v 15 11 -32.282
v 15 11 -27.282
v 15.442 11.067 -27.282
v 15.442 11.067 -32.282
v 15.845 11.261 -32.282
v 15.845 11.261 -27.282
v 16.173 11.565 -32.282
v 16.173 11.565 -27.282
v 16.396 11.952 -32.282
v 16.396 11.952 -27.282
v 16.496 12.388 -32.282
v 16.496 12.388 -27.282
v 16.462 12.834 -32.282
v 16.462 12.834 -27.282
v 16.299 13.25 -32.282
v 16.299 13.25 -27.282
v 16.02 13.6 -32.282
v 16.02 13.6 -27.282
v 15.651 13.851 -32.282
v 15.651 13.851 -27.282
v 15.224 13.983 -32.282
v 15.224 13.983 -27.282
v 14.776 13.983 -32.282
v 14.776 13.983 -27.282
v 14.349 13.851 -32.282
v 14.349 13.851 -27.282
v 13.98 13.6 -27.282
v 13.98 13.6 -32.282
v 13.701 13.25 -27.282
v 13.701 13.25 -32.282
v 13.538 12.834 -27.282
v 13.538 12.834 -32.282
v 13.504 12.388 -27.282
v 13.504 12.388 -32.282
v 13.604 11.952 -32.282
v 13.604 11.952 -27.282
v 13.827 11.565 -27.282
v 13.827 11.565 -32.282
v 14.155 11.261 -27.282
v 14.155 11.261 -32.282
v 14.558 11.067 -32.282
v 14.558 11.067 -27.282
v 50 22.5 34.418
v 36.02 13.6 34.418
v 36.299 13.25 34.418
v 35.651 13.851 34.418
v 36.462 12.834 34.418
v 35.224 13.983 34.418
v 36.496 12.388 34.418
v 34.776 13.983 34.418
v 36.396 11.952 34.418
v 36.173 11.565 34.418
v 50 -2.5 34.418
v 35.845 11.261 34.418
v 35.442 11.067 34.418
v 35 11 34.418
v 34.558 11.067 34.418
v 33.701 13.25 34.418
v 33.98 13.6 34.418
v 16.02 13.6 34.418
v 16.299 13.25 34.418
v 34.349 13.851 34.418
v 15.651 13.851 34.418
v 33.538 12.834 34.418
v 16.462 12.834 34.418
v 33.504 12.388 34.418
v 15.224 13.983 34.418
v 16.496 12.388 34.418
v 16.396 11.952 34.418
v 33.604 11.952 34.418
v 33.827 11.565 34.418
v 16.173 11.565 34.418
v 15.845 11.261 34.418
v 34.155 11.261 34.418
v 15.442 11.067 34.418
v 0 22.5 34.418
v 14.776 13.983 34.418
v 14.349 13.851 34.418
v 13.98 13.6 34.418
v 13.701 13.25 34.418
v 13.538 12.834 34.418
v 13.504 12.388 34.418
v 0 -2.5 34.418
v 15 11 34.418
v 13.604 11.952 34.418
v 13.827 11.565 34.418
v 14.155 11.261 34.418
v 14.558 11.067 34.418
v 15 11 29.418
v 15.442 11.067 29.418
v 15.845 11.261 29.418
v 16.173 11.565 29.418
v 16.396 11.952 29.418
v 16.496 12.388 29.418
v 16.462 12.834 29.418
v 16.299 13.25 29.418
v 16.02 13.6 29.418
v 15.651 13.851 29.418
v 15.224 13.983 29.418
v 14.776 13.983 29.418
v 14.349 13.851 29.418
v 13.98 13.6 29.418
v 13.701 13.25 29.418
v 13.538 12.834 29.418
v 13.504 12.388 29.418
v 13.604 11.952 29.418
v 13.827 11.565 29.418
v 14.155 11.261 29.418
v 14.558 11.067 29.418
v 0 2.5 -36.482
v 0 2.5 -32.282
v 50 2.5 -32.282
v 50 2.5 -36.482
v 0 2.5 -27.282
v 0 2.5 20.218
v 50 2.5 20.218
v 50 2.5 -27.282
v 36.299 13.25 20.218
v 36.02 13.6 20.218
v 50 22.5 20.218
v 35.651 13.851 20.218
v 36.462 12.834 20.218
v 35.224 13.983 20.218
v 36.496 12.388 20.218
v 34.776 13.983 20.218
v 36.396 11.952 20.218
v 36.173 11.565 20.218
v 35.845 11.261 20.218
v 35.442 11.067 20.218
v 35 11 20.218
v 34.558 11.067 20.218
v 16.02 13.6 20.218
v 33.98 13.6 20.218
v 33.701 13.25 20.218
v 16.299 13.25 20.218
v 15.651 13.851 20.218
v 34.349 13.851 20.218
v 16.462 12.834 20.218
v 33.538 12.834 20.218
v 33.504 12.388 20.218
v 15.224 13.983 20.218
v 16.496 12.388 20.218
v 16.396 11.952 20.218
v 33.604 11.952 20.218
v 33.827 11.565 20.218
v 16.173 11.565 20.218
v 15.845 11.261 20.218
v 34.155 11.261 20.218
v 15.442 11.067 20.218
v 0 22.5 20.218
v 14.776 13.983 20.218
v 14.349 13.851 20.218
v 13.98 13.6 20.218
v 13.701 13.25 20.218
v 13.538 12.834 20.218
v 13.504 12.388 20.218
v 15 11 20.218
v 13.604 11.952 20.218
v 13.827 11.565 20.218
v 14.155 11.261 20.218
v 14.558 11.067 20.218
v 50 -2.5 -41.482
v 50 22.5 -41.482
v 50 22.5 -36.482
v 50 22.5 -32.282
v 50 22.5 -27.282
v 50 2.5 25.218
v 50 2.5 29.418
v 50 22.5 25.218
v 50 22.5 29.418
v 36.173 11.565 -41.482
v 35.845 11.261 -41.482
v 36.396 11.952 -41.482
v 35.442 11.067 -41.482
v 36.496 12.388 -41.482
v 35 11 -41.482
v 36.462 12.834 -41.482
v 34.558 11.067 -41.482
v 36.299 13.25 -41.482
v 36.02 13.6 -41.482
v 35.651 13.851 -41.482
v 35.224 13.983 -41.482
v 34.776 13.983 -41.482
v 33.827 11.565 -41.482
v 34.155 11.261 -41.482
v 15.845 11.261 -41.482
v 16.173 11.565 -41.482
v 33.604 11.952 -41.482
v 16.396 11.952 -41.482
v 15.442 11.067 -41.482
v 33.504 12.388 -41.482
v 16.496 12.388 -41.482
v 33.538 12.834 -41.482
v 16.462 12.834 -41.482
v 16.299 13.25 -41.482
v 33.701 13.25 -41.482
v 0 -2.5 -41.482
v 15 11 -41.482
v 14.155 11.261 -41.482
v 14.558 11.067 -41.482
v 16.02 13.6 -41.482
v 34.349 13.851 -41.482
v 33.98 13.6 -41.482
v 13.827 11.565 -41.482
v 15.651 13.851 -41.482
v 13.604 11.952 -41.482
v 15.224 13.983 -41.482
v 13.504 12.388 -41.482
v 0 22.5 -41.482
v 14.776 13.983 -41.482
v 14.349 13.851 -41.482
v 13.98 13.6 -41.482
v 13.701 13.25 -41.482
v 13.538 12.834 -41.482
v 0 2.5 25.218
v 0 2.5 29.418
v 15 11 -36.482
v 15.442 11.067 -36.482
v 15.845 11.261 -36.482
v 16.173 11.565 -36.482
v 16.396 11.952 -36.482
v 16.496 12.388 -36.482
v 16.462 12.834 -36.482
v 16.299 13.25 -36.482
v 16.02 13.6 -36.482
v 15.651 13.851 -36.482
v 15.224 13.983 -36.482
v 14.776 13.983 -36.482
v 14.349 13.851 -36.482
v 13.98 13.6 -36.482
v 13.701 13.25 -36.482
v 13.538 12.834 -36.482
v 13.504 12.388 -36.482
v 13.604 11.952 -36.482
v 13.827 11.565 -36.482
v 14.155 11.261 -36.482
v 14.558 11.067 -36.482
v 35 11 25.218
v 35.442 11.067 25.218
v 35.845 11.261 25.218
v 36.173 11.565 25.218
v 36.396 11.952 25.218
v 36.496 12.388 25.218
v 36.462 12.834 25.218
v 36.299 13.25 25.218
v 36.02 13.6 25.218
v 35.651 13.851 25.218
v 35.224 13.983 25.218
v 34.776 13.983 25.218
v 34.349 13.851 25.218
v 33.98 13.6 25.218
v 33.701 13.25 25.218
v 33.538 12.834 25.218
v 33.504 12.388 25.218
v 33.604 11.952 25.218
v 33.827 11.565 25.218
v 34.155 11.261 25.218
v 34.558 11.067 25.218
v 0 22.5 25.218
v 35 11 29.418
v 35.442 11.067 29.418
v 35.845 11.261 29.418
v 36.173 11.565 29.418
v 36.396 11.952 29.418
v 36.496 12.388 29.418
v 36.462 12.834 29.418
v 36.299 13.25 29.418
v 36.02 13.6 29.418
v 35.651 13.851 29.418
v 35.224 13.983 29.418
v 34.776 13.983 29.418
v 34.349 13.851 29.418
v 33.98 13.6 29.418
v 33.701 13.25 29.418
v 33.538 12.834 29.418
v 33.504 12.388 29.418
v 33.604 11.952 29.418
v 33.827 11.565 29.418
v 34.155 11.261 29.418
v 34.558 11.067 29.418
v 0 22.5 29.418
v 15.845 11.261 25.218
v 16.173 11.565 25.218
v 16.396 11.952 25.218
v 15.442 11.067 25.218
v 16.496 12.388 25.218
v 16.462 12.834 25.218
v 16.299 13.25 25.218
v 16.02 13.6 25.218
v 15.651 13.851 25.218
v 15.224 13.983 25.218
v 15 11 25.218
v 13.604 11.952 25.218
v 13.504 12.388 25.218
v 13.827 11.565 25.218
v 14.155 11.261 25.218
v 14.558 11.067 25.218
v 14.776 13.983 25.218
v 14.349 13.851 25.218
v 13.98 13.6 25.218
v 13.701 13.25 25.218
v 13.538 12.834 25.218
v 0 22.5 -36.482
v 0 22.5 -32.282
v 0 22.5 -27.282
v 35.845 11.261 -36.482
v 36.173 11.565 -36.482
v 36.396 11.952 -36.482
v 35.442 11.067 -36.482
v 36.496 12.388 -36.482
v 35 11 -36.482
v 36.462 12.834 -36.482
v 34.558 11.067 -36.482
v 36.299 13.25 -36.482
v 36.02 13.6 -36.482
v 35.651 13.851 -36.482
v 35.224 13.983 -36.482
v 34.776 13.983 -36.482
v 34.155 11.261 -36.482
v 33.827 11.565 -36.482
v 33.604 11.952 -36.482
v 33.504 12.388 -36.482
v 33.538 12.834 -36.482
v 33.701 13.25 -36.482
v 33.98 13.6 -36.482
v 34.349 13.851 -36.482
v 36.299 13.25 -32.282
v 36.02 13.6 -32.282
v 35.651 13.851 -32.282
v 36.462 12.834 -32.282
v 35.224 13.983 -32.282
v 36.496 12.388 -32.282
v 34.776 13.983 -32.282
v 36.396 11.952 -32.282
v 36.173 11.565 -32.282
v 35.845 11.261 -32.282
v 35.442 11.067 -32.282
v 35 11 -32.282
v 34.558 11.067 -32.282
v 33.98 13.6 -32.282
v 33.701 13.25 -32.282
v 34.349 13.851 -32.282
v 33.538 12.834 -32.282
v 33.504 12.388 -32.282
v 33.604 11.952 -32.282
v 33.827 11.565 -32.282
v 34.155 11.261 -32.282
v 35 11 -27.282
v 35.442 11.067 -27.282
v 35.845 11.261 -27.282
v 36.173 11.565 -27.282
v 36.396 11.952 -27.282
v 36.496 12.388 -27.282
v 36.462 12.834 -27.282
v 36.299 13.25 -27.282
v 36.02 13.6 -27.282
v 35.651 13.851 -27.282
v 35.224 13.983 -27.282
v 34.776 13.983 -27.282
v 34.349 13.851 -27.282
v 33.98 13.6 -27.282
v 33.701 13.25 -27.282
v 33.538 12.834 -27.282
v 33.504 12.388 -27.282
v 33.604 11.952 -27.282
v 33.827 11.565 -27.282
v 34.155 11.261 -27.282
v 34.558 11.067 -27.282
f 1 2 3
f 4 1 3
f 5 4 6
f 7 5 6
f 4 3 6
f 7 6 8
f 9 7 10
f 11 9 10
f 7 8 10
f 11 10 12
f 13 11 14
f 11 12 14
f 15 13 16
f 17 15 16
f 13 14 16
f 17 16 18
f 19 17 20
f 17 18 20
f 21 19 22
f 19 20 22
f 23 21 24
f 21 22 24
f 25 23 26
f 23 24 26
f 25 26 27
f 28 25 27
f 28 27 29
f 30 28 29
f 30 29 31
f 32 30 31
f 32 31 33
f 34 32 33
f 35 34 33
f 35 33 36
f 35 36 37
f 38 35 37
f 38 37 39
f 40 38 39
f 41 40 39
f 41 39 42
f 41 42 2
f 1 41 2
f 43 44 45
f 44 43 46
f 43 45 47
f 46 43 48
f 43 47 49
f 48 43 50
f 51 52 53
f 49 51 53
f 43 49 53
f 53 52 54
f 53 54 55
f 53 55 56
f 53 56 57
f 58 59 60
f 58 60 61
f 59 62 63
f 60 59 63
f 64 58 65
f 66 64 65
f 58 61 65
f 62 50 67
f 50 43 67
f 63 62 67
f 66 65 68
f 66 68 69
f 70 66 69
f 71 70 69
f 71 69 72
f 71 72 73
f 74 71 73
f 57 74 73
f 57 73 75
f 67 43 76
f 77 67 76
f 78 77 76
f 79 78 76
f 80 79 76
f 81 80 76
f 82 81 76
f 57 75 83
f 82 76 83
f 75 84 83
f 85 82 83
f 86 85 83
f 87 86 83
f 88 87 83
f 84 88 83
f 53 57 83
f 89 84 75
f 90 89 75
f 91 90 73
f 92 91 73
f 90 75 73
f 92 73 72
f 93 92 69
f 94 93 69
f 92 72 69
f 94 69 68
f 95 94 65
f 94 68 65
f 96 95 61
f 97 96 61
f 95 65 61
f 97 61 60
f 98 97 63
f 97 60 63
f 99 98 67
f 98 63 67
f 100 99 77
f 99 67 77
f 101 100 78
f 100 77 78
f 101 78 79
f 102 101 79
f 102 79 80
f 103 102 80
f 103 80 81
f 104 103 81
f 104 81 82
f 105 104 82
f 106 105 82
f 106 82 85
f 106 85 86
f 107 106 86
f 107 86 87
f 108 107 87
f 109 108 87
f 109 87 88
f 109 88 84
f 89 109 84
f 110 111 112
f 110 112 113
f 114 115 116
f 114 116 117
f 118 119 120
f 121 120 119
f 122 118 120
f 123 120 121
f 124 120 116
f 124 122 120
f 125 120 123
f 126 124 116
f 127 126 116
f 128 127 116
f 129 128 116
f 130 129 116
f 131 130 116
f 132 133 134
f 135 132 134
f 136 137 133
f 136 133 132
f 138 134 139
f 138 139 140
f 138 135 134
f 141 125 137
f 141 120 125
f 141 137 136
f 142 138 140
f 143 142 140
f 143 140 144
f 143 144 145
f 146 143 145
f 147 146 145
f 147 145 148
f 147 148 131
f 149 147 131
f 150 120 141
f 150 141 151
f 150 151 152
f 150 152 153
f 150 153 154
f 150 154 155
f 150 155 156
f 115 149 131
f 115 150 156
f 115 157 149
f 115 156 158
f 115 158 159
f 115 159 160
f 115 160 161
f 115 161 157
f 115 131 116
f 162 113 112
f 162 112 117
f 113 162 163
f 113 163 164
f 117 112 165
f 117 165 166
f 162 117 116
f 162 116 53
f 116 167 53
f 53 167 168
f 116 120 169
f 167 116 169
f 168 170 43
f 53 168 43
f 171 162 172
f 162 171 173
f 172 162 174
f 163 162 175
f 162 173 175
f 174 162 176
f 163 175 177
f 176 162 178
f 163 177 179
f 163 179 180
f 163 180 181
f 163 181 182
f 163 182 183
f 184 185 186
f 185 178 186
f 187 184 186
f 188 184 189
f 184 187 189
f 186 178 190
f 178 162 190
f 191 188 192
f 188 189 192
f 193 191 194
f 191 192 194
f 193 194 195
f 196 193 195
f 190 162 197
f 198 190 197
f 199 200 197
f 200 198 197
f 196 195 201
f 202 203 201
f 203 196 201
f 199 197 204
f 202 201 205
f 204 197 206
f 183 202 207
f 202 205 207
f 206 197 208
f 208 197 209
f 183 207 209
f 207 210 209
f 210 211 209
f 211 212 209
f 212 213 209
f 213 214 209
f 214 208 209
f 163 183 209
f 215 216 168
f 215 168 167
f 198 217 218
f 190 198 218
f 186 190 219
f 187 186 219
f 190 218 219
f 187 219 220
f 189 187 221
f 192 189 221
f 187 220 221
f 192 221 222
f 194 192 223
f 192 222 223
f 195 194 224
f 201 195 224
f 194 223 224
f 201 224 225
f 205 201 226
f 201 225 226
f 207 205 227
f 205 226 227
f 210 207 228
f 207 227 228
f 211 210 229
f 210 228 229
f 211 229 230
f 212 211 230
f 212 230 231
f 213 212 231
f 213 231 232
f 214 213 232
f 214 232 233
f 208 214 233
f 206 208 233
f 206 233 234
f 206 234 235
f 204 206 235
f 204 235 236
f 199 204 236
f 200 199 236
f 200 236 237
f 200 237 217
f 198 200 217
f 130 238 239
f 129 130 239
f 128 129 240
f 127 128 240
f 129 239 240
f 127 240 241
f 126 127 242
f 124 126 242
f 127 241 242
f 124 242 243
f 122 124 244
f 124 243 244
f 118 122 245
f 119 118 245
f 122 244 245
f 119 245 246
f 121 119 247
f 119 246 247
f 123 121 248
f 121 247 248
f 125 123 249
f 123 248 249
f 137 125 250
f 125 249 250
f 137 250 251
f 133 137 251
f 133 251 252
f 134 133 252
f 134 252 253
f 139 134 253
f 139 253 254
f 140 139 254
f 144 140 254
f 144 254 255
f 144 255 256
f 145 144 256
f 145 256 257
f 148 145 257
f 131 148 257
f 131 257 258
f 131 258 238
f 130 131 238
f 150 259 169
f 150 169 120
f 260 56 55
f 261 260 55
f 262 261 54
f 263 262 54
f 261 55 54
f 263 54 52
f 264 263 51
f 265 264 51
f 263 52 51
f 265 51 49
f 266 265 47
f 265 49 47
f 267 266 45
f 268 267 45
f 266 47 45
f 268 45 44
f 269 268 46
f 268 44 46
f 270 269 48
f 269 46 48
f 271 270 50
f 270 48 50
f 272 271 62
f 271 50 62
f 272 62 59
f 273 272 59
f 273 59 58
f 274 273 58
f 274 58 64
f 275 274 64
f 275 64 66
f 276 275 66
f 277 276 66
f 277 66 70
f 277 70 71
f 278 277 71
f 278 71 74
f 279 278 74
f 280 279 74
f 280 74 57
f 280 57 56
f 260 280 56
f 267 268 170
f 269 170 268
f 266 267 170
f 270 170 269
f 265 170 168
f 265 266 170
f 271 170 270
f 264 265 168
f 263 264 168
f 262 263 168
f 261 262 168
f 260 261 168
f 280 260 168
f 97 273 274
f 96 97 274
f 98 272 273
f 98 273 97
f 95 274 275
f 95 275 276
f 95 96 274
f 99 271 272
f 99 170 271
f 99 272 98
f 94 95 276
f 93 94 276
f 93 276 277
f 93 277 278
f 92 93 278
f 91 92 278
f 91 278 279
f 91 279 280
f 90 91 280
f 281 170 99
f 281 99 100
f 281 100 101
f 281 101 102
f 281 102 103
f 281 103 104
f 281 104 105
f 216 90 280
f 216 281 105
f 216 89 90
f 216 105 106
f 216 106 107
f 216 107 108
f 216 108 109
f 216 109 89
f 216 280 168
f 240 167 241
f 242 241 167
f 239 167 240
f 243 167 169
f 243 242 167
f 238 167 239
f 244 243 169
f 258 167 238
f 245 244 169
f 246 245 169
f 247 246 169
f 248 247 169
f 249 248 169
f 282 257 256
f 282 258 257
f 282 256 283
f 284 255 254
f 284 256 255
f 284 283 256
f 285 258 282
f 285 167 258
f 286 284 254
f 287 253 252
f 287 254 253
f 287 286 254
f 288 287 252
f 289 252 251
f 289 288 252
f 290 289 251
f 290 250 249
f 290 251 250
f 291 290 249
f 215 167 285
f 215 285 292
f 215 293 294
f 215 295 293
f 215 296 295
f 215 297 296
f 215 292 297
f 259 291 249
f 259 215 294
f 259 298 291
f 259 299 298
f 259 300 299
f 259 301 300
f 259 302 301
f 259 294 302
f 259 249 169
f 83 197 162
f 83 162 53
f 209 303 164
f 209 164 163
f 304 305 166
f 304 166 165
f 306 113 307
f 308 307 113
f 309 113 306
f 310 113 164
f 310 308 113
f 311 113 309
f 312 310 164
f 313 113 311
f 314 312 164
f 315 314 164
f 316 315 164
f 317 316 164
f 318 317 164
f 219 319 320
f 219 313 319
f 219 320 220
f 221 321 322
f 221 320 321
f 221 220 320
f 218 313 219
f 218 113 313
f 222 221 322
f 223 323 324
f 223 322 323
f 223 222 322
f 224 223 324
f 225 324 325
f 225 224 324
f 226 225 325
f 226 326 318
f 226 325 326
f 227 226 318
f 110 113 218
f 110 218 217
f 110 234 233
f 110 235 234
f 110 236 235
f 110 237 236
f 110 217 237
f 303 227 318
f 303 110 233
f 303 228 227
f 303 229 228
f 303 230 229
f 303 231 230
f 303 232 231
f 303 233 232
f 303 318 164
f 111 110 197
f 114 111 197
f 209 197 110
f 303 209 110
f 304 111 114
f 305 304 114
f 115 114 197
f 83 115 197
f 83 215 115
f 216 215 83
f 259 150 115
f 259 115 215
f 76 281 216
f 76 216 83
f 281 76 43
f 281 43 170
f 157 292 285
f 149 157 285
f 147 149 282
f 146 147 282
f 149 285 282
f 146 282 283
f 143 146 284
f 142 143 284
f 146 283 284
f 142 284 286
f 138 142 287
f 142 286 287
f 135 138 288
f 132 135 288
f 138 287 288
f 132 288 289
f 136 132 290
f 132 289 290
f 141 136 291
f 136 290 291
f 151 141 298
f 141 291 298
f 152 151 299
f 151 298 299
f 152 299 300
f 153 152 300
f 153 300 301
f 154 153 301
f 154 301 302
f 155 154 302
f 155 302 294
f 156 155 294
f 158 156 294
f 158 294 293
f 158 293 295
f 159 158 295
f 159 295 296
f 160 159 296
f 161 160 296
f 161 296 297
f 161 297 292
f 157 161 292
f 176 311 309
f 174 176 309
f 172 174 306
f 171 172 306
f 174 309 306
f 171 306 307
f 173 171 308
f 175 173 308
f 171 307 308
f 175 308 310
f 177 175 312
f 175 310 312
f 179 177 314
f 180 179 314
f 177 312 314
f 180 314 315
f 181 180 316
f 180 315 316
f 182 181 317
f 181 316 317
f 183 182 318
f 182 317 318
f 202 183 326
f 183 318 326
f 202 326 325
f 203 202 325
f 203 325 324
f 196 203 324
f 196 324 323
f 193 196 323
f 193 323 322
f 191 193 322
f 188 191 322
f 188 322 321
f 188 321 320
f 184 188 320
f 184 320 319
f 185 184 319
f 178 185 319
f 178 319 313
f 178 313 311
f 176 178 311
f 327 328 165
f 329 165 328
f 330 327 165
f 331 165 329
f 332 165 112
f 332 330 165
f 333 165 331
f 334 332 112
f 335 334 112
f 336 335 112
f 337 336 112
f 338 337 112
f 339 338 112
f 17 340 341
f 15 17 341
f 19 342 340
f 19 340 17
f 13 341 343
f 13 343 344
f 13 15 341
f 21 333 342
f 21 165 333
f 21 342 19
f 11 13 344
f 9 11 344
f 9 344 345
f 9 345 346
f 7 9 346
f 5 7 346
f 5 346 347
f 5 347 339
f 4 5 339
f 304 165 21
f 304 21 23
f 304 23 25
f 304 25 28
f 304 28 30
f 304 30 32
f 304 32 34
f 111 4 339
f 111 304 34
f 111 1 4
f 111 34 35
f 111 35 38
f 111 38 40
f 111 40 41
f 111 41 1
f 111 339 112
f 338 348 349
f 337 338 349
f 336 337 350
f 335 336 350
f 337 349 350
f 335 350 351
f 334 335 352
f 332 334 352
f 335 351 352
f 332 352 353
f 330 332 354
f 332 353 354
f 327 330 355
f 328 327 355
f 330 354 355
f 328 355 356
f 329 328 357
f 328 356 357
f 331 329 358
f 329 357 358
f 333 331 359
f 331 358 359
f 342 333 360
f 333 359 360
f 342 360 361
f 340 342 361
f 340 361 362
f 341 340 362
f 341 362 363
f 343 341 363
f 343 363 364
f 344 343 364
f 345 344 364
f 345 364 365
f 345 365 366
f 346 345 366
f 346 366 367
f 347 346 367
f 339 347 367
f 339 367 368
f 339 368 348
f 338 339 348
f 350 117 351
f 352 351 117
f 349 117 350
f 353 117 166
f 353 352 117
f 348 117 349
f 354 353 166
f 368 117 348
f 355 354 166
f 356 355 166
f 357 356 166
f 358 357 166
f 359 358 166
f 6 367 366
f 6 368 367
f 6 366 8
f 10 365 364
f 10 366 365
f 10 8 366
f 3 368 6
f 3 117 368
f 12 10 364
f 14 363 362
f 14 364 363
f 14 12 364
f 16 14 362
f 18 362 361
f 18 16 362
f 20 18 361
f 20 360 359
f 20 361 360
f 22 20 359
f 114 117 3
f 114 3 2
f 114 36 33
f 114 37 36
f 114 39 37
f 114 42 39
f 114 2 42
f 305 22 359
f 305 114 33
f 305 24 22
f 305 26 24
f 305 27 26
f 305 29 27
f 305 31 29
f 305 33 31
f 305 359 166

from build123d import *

# Parameters (mm, degrees)
SALIENTE_EXTRUIR2_DEPTH = 50
CROQUIS4_R              = 1.5
CORTAR_EXTRUIR2_DEPTH   = 95


with BuildPart() as part:
    # Croquis2 → Saliente-Extruir2 (new body)
    with BuildSketch(Plane(origin=(0, 0, 0), x_dir=(0, 0, -1), z_dir=(1, 0, 0))):
        Polygon((-34.418181818, 2.5), (-34.418181818, 22.5), (-29.418181818, 22.5), (-29.418181818, 2.5), (-25.218181818, 2.5), (-25.218181818, 22.5), (-20.218181818, 22.5), (-20.218181818, 2.5), (27.281818182, 2.5), (27.281818182, 22.5), (32.281818182, 22.5), (32.281818182, 2.5), (36.481818182, 2.5), (36.481818182, 22.5), (41.481818182, 22.5), (41.481818182, 2.5), (41.481818182, -2.5), (-34.418181818, -2.5), align=None)
    extrude(amount=SALIENTE_EXTRUIR2_DEPTH)

    # Croquis4 → Cortar-Extruir2 (cut)
    with BuildSketch(Plane.XY.offset(34.418181818)):
        with Locations(Location((15, 12.5, 0), (0, 0, 270))):
            Circle(CROQUIS4_R)
        with Locations(Location((35, 12.5, 0), (0, 0, 270))):
            Circle(CROQUIS4_R)
    extrude(amount=-CORTAR_EXTRUIR2_DEPTH, mode=Mode.SUBTRACT)


solid = part.part
